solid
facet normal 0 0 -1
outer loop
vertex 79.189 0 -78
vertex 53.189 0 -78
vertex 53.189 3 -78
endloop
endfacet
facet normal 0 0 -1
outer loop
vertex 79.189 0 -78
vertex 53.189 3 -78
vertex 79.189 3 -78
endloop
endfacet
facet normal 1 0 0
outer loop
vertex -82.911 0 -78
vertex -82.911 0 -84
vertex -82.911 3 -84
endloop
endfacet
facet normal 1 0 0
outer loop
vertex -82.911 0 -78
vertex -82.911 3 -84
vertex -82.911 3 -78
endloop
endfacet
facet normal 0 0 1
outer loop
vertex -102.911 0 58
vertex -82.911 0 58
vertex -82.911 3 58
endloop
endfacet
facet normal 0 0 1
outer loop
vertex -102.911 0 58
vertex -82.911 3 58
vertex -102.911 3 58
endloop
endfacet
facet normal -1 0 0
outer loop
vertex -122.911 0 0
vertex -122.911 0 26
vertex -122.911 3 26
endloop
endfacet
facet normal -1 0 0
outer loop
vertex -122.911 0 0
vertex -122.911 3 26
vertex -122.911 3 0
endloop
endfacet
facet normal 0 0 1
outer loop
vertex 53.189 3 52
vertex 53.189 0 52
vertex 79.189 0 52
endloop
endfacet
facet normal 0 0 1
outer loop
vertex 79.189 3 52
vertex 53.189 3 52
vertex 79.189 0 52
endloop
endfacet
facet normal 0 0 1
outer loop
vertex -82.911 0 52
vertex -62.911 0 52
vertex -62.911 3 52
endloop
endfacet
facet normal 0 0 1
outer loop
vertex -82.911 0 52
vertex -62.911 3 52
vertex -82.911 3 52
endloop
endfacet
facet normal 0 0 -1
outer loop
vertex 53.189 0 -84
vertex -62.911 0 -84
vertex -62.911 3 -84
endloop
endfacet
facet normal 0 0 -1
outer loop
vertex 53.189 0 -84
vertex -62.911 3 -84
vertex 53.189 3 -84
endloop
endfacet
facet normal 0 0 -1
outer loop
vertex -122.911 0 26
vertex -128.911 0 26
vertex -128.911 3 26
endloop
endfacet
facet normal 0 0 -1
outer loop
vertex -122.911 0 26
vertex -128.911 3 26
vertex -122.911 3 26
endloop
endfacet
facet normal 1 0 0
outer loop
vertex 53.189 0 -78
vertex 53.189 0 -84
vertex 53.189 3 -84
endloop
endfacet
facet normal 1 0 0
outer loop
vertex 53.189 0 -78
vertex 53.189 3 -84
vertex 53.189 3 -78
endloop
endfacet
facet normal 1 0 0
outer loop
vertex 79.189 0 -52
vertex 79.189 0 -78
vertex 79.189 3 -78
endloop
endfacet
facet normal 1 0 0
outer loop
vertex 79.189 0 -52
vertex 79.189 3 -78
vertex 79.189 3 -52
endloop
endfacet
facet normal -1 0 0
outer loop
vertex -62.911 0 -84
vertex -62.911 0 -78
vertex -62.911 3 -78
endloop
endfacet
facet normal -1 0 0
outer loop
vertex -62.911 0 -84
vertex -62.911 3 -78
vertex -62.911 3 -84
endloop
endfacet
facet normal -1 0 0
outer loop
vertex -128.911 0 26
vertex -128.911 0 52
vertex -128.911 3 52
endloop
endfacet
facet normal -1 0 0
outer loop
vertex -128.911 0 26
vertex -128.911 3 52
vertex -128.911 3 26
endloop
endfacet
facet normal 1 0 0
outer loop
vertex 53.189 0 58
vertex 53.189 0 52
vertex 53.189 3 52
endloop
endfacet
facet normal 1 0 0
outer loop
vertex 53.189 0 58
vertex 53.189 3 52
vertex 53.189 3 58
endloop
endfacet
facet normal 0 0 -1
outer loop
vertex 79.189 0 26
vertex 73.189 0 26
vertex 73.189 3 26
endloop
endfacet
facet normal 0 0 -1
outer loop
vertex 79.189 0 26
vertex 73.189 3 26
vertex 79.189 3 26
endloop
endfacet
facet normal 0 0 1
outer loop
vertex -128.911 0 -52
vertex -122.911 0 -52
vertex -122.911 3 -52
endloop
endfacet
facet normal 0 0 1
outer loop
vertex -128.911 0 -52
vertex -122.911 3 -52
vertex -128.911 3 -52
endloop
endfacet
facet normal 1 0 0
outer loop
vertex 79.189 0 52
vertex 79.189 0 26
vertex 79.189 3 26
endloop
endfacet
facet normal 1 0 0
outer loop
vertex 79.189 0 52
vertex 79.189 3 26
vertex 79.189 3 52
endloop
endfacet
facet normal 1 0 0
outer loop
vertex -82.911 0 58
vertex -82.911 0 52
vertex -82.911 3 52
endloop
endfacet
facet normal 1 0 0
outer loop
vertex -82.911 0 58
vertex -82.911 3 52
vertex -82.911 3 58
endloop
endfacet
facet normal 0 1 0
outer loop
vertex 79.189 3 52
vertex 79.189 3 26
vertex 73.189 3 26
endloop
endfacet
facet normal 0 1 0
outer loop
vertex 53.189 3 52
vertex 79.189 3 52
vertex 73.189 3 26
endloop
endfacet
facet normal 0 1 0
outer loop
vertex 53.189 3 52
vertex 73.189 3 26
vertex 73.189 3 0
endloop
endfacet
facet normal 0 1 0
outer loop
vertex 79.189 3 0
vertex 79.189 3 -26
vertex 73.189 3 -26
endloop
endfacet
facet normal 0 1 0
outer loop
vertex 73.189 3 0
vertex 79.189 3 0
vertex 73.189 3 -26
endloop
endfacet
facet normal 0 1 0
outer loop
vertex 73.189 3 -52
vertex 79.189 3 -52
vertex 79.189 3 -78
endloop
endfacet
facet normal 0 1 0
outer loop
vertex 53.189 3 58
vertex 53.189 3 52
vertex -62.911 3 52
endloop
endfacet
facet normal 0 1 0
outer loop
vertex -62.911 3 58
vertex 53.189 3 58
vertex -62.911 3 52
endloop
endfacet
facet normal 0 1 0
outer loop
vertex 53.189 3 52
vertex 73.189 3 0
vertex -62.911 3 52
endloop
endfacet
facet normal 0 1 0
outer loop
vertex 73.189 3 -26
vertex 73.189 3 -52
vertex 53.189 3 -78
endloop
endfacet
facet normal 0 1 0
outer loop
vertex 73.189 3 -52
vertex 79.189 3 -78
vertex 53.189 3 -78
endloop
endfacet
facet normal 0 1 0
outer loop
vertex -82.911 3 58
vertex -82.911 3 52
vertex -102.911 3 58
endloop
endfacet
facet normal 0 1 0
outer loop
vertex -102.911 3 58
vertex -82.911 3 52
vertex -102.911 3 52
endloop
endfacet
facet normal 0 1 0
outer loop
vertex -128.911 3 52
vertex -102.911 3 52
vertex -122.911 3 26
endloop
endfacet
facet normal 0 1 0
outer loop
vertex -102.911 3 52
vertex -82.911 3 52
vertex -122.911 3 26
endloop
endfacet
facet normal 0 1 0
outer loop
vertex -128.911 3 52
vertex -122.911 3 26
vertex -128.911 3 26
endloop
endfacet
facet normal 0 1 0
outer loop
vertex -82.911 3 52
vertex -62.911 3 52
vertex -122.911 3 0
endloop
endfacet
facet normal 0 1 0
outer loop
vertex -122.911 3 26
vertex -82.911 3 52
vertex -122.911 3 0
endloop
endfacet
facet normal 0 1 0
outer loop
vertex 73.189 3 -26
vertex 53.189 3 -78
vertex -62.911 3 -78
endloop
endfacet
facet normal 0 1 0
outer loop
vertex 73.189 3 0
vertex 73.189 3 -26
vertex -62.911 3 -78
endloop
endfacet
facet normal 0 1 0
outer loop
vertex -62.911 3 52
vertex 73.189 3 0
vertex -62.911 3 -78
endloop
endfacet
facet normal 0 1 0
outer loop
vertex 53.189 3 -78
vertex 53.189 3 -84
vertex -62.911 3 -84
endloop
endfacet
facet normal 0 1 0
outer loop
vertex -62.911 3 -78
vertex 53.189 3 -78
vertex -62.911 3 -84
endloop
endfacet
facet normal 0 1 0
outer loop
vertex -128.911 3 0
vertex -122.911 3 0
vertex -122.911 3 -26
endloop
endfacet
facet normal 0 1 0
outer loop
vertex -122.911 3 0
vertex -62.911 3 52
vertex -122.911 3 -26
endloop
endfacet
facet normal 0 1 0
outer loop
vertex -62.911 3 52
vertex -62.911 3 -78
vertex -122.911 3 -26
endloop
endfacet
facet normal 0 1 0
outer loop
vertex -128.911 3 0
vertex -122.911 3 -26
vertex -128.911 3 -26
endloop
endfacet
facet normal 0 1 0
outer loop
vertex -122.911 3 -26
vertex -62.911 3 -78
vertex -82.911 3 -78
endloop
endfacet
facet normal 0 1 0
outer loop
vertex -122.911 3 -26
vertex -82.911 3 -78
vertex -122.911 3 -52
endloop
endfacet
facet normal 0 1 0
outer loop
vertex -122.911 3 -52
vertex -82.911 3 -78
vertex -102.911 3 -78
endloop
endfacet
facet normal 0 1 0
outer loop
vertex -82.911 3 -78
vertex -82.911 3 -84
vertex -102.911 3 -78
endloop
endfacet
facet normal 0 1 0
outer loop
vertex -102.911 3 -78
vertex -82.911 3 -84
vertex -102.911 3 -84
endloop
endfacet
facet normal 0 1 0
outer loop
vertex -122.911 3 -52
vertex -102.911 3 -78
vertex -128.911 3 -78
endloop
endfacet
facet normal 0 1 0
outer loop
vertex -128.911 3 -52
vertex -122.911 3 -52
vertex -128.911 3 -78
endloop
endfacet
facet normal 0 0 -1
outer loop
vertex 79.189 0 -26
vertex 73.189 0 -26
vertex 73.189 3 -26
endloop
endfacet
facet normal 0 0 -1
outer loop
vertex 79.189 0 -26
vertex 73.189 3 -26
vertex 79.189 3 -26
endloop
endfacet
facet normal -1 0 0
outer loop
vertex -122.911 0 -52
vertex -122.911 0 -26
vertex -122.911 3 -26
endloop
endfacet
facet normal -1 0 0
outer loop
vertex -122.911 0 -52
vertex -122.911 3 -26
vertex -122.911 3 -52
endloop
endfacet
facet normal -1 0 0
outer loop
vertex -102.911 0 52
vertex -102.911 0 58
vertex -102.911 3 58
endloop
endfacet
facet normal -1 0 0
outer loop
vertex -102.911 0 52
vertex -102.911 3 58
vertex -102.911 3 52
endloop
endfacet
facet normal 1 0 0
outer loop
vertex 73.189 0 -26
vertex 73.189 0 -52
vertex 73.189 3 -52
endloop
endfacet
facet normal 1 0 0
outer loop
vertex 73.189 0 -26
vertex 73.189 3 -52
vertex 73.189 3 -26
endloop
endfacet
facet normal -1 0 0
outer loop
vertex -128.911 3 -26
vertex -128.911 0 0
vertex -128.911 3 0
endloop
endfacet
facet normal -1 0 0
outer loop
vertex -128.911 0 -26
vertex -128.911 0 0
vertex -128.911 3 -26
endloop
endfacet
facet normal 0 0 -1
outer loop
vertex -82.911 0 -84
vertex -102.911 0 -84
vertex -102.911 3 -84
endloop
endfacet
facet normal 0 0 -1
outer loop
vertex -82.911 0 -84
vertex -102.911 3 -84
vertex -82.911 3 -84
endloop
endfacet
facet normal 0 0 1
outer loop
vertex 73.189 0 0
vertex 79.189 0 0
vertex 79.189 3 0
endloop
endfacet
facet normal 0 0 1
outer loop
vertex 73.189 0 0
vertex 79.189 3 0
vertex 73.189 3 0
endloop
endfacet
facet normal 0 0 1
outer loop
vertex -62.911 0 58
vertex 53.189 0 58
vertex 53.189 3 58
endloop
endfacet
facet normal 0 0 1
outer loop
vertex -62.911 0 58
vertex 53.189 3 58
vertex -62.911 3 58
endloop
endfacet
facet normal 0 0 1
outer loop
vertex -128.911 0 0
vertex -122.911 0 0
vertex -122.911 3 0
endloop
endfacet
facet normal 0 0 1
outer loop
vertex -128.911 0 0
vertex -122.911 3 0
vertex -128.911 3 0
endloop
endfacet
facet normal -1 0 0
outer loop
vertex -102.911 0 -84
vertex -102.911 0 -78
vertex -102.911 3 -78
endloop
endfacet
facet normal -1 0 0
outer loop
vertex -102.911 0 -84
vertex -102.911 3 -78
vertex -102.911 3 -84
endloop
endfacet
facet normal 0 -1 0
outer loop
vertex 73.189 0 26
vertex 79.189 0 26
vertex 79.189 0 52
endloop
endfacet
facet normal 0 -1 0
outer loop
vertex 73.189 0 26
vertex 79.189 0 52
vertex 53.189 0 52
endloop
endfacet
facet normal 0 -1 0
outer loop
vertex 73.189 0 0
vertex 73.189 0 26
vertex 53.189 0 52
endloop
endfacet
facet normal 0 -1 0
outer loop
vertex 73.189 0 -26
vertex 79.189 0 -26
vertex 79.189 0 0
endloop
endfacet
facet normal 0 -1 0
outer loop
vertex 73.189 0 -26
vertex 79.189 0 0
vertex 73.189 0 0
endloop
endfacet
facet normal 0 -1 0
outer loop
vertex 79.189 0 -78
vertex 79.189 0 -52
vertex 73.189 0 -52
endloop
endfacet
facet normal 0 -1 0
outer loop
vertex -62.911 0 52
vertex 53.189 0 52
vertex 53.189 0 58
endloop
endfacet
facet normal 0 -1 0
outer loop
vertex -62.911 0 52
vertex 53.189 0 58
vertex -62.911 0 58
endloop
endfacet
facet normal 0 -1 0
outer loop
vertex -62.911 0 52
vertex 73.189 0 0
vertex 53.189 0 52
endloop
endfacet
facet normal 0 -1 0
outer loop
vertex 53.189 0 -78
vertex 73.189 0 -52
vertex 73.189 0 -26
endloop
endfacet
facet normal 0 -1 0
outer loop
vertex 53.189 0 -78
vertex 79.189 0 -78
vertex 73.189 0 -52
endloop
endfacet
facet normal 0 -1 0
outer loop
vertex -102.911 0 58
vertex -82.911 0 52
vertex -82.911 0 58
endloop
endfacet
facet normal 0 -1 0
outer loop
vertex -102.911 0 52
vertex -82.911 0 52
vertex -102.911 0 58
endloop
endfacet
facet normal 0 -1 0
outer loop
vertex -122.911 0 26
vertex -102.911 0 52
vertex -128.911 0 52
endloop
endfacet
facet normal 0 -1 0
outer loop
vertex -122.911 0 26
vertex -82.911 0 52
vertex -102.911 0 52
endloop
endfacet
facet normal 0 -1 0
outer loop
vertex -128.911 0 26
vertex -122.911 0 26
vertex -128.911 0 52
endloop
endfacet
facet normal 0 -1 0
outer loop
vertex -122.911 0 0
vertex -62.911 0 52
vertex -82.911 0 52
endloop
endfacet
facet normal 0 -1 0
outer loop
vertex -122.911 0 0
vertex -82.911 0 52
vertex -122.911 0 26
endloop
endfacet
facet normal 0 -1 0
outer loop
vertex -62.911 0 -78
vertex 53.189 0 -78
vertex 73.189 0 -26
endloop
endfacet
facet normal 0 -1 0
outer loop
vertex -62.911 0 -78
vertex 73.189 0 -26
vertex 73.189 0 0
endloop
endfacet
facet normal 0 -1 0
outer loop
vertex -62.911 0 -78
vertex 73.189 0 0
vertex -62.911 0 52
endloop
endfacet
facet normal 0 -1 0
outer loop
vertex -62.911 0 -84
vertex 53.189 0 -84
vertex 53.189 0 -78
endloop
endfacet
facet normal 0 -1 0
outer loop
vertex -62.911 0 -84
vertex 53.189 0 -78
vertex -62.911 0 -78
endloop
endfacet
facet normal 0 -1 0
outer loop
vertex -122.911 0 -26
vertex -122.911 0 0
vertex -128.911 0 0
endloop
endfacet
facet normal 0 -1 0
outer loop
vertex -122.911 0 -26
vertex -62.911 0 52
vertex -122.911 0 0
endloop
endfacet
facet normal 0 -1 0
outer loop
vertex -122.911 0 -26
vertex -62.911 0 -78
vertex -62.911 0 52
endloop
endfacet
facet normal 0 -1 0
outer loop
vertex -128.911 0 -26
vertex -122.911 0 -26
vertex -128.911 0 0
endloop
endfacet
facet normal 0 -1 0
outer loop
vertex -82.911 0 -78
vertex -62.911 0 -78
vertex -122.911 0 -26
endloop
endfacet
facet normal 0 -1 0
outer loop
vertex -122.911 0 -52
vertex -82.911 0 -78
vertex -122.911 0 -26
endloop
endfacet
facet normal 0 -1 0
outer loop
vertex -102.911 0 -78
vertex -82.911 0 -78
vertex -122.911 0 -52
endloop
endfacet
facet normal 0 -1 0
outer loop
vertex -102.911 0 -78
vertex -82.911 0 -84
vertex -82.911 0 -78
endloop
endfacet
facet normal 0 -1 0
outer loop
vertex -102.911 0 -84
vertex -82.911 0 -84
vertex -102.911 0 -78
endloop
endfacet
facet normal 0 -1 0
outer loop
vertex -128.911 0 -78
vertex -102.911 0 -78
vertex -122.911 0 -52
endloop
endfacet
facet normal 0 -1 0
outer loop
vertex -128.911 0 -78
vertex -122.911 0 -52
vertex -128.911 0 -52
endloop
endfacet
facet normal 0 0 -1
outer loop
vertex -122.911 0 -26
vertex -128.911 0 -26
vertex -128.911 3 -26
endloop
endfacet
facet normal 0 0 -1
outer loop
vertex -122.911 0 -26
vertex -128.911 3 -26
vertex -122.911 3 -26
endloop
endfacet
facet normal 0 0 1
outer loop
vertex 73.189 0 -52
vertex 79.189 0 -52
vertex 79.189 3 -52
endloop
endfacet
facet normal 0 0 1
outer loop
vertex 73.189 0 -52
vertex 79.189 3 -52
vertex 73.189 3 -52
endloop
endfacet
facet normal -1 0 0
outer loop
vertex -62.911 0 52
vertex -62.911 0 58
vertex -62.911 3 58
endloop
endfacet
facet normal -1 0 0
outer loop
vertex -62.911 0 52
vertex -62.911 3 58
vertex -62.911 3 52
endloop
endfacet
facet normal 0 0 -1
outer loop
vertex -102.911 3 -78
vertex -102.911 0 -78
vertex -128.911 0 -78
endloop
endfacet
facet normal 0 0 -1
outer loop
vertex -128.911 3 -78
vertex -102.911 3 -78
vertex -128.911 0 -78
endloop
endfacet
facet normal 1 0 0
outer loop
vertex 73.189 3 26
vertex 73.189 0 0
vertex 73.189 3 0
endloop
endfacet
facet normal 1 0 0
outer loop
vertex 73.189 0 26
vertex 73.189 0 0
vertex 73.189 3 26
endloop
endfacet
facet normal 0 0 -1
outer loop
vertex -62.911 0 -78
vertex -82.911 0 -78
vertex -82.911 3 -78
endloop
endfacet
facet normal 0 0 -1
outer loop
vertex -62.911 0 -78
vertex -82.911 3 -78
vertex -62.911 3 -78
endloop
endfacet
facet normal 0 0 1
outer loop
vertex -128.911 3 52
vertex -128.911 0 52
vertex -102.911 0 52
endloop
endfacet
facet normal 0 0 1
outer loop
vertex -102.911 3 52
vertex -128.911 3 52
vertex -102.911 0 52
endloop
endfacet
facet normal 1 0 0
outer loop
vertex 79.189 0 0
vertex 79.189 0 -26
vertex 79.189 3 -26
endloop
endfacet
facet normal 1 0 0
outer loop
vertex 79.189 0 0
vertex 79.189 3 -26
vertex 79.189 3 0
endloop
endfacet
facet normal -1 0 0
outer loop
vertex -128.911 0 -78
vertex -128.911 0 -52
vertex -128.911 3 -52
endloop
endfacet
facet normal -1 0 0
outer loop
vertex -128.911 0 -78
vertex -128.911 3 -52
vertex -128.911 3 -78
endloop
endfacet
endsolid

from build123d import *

# Parameters (mm, degrees)
BOSS_EXTRUDE1_DEPTH = 3


with BuildPart() as part:
    # Sketch2 → Boss-Extrude1 (new body)
    with BuildSketch(Plane(origin=(0, 0, 0), x_dir=(1, 0, 0), z_dir=(0, 1, 0))):
        Polygon((-122.911356388, -52), (-128.911356388, -52), (-128.911356388, -26), (-122.911356388, -26), (-122.911356388, 0), (-128.911356388, 0), (-128.911356388, 26), (-122.911356388, 26), (-122.911356388, 52), (-128.911356388, 52), (-128.911356388, 78), (-122.911356388, 78), (-102.911356388, 78), (-102.911356388, 84), (-82.911356388, 84), (-82.911356388, 78), (-62.911356388, 78), (-62.911356388, 84), (53.188643612, 84), (53.188643612, 78), (79.188643612, 78), (79.188643612, 52), (73.188643612, 52), (73.188643612, 26), (79.188643612, 26), (79.188643612, 0), (73.188643612, 0), (73.188643612, -26), (79.188643612, -26), (79.188643612, -52), (73.188643612, -52), (53.188643612, -52), (53.188643612, -58), (-62.911356388, -58), (-62.911356388, -52), (-82.911356388, -52), (-82.911356388, -58), (-102.911356388, -58), (-102.911356388, -52), align=None)
    extrude(amount=BOSS_EXTRUDE1_DEPTH)


solid = part.part
